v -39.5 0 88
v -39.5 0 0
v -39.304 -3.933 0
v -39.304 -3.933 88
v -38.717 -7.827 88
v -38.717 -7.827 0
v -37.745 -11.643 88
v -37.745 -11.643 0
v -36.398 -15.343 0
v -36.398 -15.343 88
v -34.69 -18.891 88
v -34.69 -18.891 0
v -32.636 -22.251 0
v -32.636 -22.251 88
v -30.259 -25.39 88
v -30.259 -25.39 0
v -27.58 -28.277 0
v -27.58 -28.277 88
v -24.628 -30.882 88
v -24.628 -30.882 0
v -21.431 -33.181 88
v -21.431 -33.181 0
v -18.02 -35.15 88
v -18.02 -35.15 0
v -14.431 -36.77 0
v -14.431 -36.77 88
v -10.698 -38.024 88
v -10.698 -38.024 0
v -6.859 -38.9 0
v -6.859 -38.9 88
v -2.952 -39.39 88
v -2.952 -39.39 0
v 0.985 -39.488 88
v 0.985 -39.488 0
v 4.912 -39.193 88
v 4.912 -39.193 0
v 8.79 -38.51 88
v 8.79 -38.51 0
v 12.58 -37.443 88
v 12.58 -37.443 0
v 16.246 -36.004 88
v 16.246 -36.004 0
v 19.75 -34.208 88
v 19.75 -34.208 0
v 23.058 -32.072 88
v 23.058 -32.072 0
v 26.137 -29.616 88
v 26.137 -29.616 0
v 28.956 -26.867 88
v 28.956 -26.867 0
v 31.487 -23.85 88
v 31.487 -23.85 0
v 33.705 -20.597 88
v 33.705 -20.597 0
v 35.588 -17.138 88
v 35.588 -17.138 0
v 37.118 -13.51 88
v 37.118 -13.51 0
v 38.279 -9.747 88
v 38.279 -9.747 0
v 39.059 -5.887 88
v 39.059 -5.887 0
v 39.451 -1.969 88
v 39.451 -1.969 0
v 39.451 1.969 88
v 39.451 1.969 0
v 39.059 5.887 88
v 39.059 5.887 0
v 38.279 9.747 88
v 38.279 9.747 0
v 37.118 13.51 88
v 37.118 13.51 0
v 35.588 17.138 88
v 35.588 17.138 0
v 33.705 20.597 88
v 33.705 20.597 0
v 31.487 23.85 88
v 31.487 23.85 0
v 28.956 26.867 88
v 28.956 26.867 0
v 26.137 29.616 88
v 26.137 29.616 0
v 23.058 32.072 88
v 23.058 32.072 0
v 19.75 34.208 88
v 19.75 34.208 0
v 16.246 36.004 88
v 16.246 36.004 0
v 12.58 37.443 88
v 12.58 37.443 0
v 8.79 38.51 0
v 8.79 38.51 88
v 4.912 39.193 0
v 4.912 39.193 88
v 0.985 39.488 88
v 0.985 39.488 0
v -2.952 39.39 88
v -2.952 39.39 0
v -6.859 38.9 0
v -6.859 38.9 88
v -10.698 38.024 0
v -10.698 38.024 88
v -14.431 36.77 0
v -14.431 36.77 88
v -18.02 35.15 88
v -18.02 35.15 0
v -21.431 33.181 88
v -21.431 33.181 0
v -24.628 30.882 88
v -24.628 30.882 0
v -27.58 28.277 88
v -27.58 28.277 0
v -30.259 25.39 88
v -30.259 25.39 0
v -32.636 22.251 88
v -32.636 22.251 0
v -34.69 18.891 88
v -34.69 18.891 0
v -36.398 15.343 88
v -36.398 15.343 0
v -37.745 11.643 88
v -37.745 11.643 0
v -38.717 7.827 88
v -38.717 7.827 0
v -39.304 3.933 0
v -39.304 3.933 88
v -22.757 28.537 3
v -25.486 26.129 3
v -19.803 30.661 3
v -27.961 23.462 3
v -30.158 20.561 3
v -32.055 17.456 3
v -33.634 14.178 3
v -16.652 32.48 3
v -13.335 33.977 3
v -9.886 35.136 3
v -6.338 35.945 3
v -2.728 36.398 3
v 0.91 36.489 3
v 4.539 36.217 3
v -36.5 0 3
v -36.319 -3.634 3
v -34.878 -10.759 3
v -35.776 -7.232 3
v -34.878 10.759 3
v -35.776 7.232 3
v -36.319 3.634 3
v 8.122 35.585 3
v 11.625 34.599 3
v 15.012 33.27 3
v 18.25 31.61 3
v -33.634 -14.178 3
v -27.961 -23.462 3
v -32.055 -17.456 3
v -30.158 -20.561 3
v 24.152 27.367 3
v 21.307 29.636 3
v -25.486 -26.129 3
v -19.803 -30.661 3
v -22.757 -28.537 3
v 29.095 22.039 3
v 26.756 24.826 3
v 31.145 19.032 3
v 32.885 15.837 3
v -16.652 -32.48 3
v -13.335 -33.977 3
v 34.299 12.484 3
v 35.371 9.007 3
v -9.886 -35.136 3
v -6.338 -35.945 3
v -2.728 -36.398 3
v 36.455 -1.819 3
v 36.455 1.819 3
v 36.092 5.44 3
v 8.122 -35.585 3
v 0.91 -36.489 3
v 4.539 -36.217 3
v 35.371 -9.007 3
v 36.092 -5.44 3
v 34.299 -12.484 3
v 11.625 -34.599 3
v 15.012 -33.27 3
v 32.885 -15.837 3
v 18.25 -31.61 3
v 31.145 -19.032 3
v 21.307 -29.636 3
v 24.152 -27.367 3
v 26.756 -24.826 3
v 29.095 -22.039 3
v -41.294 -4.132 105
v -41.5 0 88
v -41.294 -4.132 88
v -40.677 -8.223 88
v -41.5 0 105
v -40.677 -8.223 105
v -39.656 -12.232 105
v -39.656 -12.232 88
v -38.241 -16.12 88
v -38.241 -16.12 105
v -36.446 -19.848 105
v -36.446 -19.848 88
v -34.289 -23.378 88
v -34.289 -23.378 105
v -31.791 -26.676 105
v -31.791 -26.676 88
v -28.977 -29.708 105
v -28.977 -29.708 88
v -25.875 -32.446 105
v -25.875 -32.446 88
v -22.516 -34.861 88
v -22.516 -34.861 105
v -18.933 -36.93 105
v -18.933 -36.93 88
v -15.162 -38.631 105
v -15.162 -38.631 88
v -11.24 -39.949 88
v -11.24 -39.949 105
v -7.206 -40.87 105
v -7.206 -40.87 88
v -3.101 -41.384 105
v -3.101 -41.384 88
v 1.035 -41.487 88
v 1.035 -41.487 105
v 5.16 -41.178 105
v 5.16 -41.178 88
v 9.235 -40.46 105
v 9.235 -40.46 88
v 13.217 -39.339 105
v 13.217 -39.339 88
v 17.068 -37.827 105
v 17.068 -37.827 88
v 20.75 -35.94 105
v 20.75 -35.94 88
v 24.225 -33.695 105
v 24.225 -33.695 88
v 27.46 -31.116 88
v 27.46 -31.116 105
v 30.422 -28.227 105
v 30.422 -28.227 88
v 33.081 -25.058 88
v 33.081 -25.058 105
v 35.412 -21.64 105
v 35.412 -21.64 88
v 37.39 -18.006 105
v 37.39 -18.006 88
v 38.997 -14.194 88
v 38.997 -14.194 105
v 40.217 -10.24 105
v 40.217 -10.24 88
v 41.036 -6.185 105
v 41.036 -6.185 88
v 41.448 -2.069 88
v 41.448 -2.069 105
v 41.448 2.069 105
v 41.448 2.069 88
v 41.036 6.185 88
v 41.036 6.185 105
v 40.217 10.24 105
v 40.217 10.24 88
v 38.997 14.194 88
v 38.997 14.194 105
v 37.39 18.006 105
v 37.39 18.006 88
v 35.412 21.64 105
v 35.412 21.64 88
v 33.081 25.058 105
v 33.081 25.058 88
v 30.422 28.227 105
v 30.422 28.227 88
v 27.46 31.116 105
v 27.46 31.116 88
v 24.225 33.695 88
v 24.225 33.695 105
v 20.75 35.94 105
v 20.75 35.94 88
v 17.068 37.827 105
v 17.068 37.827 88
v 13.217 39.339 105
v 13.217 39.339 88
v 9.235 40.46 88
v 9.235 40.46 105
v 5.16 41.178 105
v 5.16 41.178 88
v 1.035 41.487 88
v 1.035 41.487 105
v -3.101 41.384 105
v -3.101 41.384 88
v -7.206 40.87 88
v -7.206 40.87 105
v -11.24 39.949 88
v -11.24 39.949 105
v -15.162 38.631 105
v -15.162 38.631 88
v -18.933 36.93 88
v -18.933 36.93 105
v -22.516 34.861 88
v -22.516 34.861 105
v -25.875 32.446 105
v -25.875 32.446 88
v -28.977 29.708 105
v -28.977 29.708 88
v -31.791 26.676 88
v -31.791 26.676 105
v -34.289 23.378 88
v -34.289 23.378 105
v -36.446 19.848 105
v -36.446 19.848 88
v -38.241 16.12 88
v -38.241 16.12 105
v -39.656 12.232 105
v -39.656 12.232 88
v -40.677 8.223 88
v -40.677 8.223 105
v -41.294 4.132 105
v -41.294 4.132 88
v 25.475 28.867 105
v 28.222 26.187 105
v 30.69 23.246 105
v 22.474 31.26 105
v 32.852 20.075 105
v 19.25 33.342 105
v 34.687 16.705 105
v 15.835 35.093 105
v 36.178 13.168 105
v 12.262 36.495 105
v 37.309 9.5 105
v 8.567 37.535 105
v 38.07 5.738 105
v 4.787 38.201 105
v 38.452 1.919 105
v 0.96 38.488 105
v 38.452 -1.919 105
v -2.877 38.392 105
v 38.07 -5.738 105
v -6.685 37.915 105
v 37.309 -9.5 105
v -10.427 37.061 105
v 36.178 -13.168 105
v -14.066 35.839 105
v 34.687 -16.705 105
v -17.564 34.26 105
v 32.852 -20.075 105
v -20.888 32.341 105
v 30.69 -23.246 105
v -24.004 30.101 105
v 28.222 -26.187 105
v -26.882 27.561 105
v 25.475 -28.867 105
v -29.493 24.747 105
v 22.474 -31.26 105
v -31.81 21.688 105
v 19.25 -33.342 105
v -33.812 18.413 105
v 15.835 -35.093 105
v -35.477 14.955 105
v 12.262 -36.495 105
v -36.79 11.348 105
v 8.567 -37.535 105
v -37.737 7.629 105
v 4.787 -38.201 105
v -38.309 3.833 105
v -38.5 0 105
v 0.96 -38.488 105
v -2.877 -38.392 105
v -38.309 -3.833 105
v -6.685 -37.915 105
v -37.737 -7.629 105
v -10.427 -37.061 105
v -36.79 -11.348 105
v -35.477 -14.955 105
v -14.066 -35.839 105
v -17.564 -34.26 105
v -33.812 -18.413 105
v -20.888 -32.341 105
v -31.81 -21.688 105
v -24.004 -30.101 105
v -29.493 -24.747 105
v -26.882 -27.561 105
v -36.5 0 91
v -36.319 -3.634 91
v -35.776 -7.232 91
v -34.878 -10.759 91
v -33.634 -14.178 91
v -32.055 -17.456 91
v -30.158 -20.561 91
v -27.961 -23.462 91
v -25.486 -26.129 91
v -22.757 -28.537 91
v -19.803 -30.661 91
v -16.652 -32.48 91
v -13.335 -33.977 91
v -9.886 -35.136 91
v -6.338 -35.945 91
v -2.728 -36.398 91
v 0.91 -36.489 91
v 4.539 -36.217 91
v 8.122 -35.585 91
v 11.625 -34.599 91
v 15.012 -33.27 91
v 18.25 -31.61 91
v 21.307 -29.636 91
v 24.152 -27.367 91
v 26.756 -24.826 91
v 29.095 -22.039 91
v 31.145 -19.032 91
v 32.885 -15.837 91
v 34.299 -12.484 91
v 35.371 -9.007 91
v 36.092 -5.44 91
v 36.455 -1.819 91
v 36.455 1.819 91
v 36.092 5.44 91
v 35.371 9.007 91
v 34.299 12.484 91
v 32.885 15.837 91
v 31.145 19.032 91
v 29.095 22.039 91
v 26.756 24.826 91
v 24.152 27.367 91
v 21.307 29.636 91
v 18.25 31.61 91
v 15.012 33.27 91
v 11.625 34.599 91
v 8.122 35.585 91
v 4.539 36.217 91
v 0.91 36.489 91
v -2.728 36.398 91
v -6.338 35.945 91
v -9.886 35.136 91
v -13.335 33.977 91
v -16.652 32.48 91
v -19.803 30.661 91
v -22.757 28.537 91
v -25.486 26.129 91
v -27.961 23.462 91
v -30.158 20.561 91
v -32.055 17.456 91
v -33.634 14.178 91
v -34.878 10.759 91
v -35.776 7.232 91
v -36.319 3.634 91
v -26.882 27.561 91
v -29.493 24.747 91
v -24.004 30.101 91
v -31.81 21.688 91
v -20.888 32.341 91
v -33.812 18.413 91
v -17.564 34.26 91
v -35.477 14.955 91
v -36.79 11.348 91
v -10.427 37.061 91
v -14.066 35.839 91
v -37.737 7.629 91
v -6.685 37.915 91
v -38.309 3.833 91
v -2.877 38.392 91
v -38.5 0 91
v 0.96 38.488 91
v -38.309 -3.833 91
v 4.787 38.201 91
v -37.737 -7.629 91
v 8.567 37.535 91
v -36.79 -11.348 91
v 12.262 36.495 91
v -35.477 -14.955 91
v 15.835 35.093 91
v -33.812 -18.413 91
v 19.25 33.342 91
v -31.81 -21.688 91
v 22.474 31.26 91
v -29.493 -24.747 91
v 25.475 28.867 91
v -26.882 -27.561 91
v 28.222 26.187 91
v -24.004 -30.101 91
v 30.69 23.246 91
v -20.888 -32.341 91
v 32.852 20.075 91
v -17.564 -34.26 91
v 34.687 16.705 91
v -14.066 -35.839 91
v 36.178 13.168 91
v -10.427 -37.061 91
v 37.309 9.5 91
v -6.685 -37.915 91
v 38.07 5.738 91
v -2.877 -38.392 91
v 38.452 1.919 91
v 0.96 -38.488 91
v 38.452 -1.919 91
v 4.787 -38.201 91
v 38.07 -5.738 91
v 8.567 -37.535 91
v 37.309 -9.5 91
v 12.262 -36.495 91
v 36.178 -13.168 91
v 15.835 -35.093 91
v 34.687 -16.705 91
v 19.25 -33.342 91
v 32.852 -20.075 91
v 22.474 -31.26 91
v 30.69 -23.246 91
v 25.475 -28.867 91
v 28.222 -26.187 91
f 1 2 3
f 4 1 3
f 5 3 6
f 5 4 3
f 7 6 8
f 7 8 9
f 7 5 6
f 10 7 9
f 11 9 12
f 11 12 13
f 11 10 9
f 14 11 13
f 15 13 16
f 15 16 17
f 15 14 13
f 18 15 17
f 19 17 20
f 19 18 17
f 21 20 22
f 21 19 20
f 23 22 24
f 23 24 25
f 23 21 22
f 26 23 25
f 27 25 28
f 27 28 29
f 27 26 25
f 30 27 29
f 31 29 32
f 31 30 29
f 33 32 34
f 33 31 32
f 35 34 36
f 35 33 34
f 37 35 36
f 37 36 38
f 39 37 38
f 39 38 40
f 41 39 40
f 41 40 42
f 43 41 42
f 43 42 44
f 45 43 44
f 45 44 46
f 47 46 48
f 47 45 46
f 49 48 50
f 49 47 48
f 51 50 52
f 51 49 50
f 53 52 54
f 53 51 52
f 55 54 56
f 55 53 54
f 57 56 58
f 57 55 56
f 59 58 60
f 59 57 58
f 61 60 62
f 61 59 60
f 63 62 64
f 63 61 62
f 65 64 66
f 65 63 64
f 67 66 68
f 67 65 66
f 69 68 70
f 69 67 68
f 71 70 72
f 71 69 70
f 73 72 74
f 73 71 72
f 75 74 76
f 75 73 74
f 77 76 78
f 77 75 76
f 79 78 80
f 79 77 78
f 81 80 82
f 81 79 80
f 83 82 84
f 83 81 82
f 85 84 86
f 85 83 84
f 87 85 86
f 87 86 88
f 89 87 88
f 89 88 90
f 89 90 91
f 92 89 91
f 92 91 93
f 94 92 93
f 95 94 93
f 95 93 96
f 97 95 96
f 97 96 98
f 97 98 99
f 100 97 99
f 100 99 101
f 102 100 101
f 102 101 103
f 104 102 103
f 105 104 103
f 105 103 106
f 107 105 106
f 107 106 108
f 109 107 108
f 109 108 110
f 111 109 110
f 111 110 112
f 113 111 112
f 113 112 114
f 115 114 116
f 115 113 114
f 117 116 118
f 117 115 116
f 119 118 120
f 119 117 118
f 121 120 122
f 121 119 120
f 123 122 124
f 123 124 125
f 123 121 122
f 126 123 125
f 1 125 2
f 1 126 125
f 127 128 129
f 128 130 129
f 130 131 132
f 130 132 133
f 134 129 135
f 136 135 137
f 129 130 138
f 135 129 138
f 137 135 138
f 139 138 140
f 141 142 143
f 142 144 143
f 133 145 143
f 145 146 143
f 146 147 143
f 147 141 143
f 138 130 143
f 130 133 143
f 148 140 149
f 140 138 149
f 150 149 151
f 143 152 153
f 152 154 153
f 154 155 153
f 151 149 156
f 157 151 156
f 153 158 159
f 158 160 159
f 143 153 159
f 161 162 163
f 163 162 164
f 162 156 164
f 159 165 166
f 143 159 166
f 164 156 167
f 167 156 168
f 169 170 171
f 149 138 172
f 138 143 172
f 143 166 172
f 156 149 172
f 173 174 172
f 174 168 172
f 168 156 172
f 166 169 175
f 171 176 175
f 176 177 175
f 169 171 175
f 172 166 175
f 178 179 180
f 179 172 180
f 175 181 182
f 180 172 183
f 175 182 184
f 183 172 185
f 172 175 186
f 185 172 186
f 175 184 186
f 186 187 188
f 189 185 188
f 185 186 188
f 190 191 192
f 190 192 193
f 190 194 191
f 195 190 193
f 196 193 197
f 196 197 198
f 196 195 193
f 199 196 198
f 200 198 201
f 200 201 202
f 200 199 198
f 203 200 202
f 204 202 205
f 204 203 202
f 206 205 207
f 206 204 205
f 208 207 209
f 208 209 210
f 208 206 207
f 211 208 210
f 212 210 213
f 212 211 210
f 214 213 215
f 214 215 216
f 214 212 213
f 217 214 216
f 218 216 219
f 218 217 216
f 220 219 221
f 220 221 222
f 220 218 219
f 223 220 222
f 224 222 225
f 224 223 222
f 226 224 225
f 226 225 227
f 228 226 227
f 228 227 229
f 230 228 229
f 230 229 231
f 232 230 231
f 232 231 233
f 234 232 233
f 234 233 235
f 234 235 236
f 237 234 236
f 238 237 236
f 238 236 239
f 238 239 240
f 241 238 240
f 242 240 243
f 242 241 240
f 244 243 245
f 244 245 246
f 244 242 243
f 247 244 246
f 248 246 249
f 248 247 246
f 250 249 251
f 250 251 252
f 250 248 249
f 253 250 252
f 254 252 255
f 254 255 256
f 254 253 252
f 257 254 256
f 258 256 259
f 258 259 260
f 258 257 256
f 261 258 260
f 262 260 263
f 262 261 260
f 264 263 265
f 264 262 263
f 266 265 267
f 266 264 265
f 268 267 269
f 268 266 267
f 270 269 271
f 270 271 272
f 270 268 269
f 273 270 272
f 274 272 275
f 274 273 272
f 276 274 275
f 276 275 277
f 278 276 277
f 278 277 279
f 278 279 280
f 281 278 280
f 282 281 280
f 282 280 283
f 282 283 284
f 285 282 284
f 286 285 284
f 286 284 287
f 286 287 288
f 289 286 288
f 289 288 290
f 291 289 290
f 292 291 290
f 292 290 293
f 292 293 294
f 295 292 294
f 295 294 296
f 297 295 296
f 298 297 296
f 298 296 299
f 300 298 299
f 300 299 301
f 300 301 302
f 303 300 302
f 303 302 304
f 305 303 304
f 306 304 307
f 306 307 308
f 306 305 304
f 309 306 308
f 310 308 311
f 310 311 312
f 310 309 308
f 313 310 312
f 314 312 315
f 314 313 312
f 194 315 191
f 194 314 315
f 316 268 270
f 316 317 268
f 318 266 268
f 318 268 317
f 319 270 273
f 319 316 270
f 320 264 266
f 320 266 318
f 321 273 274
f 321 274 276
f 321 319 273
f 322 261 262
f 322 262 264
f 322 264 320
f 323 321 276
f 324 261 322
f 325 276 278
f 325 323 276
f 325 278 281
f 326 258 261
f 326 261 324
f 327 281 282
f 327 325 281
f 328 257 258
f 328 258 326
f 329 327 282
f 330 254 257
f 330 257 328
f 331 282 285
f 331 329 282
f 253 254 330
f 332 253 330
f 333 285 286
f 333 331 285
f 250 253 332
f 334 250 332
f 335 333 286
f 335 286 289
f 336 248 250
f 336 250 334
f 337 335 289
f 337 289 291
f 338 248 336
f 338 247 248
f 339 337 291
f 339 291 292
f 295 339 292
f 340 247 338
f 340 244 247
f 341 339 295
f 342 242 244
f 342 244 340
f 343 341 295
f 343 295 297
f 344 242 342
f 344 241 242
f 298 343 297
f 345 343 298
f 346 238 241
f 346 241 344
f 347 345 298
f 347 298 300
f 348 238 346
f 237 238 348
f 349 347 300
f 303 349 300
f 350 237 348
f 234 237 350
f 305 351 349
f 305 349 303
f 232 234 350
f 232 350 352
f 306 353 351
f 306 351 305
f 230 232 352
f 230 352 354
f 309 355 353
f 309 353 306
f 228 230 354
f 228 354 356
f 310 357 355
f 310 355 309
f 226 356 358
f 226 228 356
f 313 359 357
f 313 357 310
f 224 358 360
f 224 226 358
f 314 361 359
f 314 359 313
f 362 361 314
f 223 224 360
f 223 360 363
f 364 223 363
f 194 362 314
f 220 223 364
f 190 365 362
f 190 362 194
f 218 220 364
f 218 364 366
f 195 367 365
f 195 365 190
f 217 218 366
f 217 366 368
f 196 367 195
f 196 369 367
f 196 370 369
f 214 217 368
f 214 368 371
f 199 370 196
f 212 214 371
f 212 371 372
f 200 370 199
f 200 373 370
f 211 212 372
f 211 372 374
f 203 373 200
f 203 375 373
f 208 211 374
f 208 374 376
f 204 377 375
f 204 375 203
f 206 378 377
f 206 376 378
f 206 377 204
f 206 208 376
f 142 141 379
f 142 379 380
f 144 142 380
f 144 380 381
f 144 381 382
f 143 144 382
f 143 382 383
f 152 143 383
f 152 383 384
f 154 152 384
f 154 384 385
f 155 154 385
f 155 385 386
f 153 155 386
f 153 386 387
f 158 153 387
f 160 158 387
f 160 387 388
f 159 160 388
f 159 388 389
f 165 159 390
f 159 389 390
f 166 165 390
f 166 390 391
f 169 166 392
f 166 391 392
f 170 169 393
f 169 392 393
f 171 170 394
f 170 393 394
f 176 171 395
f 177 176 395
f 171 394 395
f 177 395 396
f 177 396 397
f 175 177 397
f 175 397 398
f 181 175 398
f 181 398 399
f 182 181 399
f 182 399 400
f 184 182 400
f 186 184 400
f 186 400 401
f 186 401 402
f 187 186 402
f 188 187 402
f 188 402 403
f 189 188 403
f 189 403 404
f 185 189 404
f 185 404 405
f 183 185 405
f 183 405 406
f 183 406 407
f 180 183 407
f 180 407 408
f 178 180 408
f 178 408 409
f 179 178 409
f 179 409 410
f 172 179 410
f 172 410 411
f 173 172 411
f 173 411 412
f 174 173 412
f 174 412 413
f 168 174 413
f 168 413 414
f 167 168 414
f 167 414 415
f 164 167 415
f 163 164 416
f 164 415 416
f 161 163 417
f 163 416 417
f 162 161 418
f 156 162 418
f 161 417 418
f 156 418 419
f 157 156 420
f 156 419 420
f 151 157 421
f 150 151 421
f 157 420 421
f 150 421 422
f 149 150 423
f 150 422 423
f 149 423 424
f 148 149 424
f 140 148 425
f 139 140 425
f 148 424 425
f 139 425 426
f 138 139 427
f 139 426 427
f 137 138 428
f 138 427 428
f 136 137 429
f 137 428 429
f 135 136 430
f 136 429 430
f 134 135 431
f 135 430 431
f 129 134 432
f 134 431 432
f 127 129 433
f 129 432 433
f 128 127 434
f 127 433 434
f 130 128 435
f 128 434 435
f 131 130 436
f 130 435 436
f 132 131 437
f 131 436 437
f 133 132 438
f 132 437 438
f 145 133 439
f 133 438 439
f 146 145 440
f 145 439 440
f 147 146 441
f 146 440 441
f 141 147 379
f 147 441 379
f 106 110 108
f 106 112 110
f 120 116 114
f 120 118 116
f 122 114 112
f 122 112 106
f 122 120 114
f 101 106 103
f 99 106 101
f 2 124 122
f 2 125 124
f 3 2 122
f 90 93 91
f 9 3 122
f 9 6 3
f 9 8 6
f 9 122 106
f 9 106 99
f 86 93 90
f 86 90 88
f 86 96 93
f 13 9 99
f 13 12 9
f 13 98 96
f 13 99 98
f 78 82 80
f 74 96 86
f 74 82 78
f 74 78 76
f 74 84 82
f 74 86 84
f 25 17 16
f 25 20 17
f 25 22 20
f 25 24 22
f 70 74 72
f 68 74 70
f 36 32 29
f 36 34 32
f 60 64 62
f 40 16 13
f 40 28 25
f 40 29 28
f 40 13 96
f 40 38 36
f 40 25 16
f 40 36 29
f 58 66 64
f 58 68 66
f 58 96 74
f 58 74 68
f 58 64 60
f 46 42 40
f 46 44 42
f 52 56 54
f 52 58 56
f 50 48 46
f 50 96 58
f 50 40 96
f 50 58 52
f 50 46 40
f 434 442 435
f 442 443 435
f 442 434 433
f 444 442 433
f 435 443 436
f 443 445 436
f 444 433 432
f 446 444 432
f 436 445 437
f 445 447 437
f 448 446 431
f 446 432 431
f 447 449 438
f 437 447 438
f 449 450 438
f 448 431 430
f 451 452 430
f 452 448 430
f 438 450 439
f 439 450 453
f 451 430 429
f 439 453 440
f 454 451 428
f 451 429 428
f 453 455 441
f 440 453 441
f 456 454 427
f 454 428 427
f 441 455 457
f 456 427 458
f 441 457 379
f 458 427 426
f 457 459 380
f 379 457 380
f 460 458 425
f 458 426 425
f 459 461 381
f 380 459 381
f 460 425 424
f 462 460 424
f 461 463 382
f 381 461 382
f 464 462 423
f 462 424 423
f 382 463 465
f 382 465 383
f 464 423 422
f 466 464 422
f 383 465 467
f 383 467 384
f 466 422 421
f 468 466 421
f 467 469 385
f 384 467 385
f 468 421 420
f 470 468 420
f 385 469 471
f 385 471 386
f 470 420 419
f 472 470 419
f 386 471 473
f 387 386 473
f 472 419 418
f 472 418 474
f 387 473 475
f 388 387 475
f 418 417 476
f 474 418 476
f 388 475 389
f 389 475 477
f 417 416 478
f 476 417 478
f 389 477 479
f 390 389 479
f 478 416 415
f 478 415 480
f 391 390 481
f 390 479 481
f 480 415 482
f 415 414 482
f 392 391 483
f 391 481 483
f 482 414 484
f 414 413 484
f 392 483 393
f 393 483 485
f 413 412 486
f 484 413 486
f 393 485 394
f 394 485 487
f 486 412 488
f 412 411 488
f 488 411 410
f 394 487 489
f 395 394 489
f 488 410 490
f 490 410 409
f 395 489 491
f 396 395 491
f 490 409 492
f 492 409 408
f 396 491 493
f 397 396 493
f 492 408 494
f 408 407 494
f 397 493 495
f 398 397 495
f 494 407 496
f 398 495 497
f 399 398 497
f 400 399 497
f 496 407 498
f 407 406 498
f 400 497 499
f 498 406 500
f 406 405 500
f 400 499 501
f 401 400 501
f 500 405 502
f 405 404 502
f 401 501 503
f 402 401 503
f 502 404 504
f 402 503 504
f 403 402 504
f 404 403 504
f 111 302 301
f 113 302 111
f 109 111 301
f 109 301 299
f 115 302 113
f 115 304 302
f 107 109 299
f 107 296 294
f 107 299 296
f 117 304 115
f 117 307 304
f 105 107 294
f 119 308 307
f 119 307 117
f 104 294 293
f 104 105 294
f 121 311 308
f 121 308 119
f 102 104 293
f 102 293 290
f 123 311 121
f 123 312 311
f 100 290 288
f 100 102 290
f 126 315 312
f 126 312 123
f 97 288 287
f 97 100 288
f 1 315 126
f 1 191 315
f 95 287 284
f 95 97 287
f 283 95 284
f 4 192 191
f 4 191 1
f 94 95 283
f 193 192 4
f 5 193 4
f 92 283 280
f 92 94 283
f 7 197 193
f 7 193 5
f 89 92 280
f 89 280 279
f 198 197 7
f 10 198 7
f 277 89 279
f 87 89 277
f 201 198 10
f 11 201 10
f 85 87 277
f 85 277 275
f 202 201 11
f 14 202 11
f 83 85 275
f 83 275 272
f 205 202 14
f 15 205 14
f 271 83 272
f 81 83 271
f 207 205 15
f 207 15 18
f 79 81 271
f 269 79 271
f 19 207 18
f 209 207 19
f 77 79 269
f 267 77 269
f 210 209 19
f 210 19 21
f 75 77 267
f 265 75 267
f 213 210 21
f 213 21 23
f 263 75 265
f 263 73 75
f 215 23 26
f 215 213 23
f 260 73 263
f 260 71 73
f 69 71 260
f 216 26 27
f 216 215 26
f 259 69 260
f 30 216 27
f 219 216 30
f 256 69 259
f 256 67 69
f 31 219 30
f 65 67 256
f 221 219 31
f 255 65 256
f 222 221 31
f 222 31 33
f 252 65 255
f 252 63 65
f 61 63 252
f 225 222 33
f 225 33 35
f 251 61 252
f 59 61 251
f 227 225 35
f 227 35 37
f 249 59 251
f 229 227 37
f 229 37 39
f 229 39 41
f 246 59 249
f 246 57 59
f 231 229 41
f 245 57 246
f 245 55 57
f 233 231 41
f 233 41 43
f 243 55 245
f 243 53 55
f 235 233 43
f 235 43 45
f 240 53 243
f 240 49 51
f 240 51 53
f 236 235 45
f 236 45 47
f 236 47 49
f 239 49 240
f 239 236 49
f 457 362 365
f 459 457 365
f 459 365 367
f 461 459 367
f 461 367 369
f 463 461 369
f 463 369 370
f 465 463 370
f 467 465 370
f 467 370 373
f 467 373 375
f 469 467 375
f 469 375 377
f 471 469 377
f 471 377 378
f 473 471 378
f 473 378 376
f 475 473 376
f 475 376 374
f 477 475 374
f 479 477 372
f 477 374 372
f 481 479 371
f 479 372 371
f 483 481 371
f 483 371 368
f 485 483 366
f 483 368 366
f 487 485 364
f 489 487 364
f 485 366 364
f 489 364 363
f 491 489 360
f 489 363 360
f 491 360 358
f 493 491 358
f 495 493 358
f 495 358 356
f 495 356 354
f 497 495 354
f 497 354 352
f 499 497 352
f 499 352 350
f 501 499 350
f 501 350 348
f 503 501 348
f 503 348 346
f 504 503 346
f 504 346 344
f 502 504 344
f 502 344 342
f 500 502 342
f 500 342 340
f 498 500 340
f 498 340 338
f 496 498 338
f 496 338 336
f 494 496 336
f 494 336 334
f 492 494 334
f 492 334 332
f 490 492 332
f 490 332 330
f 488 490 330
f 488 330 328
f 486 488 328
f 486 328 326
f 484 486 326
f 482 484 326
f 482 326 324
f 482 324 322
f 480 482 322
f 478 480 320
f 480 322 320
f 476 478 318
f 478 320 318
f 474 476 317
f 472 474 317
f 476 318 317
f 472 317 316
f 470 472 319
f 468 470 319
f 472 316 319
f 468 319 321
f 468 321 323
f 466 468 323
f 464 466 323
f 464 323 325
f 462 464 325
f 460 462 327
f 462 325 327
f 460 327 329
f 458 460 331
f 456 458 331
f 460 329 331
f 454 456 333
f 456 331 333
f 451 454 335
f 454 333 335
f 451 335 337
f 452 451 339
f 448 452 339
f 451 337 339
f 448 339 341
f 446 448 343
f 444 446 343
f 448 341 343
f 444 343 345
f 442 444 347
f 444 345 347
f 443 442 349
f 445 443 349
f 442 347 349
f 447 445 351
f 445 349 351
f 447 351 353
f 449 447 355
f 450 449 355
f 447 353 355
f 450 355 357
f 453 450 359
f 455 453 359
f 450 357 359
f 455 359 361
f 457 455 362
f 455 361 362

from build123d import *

# Parameters (mm, degrees)
THICKNESS_T = -3


with BuildPart() as part:
    # Sketch → Revolution (revolve)
    with BuildSketch(Plane.XZ):
        Polygon((0, 0), (-39.5, 0), (-39.5, 88), (-41.5, 88), (-41.5, 105), (0, 105), align=None)
    revolve(axis=Axis((0, 0, 0), (0, 0, 1)))

    # Thickness
    thickness_openings = [part.faces().sort_by_distance(p)[0] for p in [
        (0, 0, 105),
    ]]
    offset(amount=THICKNESS_T, openings=thickness_openings, kind=Kind.INTERSECTION)


solid = part.part
